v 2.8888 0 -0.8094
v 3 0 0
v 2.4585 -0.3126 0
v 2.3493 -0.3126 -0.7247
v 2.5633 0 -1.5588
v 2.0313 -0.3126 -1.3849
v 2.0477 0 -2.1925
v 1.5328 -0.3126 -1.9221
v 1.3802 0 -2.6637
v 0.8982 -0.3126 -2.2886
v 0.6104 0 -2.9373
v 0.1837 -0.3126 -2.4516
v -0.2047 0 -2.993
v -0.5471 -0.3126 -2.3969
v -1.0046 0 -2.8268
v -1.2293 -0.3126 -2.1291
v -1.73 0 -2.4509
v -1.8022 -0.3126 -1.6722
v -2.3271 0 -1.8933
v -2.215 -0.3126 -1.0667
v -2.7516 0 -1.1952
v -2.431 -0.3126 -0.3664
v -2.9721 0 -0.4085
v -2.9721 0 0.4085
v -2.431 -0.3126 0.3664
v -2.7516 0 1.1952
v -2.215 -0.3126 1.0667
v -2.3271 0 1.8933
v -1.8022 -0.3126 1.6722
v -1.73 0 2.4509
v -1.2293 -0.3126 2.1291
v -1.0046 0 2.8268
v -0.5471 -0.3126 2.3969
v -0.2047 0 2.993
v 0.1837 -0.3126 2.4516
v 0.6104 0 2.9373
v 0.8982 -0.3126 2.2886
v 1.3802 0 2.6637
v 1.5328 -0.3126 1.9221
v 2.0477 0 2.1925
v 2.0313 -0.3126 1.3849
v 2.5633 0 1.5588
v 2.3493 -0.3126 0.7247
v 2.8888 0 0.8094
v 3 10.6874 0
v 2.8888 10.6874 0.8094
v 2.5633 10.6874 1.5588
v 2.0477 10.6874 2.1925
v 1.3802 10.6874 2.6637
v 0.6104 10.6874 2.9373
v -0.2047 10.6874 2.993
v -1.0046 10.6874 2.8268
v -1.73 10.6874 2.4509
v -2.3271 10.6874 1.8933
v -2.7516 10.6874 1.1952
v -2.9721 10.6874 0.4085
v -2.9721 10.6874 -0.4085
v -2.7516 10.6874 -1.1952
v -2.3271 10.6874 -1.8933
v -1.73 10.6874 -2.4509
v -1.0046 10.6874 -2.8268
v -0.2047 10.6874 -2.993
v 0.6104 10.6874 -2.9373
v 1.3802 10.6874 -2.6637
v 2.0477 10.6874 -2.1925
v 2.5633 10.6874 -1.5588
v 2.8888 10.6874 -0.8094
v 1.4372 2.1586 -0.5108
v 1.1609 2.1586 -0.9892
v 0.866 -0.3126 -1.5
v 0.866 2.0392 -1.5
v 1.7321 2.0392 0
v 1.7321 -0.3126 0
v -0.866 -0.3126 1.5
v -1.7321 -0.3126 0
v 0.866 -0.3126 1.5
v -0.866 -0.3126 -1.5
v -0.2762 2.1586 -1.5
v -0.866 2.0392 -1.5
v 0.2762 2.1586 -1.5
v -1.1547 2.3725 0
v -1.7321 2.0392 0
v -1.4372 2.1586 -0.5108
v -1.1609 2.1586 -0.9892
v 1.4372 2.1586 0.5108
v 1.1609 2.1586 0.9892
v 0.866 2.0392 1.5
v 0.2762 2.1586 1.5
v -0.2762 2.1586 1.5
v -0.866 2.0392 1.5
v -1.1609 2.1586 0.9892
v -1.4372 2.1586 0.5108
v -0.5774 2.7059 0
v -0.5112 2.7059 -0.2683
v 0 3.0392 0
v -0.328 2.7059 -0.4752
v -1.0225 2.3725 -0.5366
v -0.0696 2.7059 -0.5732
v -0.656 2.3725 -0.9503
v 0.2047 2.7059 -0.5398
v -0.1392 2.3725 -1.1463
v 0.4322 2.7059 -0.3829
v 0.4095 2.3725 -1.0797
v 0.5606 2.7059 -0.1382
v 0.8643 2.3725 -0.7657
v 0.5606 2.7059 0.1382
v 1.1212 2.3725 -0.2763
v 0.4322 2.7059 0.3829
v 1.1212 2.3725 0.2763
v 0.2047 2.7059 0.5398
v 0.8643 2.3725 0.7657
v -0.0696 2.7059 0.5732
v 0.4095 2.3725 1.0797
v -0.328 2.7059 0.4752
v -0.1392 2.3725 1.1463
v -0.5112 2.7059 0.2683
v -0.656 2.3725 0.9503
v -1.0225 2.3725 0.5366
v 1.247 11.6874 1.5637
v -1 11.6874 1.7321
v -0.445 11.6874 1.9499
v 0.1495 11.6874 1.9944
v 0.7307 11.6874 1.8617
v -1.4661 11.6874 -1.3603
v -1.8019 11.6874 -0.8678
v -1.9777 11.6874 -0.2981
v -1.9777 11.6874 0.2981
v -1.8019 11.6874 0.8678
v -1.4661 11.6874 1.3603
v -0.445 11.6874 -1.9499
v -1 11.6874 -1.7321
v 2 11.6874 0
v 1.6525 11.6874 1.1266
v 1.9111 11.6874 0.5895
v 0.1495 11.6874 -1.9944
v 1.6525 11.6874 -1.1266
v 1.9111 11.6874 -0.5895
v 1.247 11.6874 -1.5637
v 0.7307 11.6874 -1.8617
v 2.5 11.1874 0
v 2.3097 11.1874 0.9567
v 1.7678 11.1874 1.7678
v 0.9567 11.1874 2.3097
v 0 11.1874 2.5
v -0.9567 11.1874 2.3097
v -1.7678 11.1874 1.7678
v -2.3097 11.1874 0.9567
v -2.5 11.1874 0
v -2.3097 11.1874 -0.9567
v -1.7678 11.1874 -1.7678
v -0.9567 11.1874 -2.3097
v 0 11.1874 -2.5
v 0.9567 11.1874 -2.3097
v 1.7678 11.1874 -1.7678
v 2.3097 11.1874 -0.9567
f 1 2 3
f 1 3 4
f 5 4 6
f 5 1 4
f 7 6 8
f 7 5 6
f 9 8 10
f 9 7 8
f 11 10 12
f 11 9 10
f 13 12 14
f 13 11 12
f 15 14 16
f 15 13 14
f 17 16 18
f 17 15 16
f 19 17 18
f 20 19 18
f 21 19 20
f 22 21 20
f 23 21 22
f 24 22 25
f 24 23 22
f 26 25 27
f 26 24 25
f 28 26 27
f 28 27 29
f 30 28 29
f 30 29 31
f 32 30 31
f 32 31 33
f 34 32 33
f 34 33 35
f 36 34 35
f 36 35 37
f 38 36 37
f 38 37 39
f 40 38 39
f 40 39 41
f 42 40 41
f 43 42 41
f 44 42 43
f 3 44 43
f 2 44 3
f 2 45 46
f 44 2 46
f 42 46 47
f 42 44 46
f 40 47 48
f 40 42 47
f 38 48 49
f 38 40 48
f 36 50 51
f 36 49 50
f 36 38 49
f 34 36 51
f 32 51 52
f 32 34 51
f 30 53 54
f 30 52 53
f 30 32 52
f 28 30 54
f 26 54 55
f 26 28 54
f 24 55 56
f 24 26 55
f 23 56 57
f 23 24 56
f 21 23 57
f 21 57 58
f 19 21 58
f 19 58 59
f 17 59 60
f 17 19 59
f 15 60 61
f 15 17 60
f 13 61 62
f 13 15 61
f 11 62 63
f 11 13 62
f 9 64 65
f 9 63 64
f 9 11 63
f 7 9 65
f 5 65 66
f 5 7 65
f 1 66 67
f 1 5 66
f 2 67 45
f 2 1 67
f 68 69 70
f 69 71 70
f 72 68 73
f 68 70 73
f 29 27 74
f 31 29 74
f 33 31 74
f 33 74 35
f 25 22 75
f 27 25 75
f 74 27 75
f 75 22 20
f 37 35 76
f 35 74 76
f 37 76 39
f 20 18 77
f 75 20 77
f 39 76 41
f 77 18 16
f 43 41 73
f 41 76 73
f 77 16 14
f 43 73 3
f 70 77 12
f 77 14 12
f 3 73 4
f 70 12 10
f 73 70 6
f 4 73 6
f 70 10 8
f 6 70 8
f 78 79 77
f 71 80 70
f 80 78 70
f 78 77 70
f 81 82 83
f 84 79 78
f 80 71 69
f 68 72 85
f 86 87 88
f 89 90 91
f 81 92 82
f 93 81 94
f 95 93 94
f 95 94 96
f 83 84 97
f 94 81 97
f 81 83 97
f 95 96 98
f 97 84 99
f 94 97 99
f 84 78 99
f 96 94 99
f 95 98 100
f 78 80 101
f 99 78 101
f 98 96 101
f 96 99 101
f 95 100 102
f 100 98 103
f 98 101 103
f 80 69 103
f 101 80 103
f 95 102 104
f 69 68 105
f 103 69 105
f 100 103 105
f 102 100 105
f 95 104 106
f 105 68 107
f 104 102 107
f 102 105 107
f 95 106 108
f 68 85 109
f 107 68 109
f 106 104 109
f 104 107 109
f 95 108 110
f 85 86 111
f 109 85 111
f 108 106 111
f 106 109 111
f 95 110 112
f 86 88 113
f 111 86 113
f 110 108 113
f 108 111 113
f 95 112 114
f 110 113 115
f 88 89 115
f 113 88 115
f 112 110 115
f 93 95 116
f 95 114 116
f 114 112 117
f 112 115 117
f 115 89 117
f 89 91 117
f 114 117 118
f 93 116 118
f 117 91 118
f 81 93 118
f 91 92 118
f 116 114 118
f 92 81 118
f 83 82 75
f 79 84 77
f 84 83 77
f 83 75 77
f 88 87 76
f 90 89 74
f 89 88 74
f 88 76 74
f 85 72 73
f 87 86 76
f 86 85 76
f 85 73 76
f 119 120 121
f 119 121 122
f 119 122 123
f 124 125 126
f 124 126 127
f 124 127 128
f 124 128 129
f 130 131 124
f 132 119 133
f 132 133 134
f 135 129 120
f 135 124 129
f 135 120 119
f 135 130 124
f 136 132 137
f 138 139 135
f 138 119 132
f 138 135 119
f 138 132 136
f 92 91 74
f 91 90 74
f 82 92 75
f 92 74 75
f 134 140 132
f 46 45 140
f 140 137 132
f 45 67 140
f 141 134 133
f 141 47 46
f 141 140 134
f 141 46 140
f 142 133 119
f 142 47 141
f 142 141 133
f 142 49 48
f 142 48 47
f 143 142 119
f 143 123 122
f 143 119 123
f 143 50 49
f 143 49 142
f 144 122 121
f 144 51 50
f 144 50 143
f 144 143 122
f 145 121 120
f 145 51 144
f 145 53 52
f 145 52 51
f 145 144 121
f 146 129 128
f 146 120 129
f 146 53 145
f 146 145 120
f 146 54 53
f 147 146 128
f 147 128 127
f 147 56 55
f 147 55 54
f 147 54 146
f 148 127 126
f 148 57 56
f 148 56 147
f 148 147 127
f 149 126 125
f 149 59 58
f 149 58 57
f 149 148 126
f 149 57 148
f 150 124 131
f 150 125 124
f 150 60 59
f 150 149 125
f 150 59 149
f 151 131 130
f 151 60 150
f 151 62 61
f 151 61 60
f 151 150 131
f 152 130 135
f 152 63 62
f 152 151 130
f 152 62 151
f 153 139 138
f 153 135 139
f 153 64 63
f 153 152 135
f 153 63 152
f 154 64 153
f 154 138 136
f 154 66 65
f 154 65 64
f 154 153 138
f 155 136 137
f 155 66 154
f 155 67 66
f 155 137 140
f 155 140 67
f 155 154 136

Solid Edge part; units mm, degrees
sketch "Sketch1" plane through (0, 0, 0) normal (0, 0, 1) x (1, 0, 0)
  line L0 (3, 10.6874) -> (3, 0)
  line L1 (2.4585, -0.3126) -> (3, 0)
  line L2 (0, -0.3126) -> (2.4585, -0.3126)
  line L3 (0, 0) -> (0, -0.3126)
  line L4 (0, 0) -> (0, 11.6874)
  line L5 (0, 11.6874) -> (2, 11.6874)
  line L6 (2, 11.6874) -> (3, 10.6874)
  dimension "D1" = 2
  dimension "D2" = 3
  dimension "D3" = 2.4585
  dimension "D4" = 12
revolve "RevolvedProtrusion1" add sketch "Sketch1" angle 360 about axis through (0, 0, 0) along (0, 1, 0)
sketch "Sketch2" plane through (0, 0, 0) normal (0, 0, 1) x (1, 0, 0)
  line L0 (0, -0.3126) -> (0, 3.0392)
  line L1 (-2.3414, 1.6874) -> (0, 3.0392)
  line L2 (-2.3414, -0.3126) -> (-2.3414, 1.6874)
  line L3 (0, -0.3126) -> (-2.3414, -0.3126)
revolve "RevolvedCutout1" cut sketch "Sketch2" angle 360 about axis through (0, -0.1937, 0) along (0, 1, 0)
sketch "Sketch3" plane through (0, -0.3126, 0) normal (0, -1, 0) x (0, 0, -1)
  line L0 (-1.5, -0.866) -> (0, -1.7321)
  line L1 (0, -1.7321) -> (1.5, -0.866)
  line L2 (1.5, -0.866) -> (1.5, 0.866)
  line L3 (1.5, 0.866) -> (0, 1.7321)
  line L4 (0, 1.7321) -> (-1.5, 0.866)
  line L5 (-1.5, 0.866) -> (-1.5, -0.866)
  circle A0 centre (0, 0) radius 2.3414
  dimension "D1" = 3
extrude "Protrusion1" add sketch "Sketch3" against normal up to next
cosmetic_thread "Thread1" size "M6"
